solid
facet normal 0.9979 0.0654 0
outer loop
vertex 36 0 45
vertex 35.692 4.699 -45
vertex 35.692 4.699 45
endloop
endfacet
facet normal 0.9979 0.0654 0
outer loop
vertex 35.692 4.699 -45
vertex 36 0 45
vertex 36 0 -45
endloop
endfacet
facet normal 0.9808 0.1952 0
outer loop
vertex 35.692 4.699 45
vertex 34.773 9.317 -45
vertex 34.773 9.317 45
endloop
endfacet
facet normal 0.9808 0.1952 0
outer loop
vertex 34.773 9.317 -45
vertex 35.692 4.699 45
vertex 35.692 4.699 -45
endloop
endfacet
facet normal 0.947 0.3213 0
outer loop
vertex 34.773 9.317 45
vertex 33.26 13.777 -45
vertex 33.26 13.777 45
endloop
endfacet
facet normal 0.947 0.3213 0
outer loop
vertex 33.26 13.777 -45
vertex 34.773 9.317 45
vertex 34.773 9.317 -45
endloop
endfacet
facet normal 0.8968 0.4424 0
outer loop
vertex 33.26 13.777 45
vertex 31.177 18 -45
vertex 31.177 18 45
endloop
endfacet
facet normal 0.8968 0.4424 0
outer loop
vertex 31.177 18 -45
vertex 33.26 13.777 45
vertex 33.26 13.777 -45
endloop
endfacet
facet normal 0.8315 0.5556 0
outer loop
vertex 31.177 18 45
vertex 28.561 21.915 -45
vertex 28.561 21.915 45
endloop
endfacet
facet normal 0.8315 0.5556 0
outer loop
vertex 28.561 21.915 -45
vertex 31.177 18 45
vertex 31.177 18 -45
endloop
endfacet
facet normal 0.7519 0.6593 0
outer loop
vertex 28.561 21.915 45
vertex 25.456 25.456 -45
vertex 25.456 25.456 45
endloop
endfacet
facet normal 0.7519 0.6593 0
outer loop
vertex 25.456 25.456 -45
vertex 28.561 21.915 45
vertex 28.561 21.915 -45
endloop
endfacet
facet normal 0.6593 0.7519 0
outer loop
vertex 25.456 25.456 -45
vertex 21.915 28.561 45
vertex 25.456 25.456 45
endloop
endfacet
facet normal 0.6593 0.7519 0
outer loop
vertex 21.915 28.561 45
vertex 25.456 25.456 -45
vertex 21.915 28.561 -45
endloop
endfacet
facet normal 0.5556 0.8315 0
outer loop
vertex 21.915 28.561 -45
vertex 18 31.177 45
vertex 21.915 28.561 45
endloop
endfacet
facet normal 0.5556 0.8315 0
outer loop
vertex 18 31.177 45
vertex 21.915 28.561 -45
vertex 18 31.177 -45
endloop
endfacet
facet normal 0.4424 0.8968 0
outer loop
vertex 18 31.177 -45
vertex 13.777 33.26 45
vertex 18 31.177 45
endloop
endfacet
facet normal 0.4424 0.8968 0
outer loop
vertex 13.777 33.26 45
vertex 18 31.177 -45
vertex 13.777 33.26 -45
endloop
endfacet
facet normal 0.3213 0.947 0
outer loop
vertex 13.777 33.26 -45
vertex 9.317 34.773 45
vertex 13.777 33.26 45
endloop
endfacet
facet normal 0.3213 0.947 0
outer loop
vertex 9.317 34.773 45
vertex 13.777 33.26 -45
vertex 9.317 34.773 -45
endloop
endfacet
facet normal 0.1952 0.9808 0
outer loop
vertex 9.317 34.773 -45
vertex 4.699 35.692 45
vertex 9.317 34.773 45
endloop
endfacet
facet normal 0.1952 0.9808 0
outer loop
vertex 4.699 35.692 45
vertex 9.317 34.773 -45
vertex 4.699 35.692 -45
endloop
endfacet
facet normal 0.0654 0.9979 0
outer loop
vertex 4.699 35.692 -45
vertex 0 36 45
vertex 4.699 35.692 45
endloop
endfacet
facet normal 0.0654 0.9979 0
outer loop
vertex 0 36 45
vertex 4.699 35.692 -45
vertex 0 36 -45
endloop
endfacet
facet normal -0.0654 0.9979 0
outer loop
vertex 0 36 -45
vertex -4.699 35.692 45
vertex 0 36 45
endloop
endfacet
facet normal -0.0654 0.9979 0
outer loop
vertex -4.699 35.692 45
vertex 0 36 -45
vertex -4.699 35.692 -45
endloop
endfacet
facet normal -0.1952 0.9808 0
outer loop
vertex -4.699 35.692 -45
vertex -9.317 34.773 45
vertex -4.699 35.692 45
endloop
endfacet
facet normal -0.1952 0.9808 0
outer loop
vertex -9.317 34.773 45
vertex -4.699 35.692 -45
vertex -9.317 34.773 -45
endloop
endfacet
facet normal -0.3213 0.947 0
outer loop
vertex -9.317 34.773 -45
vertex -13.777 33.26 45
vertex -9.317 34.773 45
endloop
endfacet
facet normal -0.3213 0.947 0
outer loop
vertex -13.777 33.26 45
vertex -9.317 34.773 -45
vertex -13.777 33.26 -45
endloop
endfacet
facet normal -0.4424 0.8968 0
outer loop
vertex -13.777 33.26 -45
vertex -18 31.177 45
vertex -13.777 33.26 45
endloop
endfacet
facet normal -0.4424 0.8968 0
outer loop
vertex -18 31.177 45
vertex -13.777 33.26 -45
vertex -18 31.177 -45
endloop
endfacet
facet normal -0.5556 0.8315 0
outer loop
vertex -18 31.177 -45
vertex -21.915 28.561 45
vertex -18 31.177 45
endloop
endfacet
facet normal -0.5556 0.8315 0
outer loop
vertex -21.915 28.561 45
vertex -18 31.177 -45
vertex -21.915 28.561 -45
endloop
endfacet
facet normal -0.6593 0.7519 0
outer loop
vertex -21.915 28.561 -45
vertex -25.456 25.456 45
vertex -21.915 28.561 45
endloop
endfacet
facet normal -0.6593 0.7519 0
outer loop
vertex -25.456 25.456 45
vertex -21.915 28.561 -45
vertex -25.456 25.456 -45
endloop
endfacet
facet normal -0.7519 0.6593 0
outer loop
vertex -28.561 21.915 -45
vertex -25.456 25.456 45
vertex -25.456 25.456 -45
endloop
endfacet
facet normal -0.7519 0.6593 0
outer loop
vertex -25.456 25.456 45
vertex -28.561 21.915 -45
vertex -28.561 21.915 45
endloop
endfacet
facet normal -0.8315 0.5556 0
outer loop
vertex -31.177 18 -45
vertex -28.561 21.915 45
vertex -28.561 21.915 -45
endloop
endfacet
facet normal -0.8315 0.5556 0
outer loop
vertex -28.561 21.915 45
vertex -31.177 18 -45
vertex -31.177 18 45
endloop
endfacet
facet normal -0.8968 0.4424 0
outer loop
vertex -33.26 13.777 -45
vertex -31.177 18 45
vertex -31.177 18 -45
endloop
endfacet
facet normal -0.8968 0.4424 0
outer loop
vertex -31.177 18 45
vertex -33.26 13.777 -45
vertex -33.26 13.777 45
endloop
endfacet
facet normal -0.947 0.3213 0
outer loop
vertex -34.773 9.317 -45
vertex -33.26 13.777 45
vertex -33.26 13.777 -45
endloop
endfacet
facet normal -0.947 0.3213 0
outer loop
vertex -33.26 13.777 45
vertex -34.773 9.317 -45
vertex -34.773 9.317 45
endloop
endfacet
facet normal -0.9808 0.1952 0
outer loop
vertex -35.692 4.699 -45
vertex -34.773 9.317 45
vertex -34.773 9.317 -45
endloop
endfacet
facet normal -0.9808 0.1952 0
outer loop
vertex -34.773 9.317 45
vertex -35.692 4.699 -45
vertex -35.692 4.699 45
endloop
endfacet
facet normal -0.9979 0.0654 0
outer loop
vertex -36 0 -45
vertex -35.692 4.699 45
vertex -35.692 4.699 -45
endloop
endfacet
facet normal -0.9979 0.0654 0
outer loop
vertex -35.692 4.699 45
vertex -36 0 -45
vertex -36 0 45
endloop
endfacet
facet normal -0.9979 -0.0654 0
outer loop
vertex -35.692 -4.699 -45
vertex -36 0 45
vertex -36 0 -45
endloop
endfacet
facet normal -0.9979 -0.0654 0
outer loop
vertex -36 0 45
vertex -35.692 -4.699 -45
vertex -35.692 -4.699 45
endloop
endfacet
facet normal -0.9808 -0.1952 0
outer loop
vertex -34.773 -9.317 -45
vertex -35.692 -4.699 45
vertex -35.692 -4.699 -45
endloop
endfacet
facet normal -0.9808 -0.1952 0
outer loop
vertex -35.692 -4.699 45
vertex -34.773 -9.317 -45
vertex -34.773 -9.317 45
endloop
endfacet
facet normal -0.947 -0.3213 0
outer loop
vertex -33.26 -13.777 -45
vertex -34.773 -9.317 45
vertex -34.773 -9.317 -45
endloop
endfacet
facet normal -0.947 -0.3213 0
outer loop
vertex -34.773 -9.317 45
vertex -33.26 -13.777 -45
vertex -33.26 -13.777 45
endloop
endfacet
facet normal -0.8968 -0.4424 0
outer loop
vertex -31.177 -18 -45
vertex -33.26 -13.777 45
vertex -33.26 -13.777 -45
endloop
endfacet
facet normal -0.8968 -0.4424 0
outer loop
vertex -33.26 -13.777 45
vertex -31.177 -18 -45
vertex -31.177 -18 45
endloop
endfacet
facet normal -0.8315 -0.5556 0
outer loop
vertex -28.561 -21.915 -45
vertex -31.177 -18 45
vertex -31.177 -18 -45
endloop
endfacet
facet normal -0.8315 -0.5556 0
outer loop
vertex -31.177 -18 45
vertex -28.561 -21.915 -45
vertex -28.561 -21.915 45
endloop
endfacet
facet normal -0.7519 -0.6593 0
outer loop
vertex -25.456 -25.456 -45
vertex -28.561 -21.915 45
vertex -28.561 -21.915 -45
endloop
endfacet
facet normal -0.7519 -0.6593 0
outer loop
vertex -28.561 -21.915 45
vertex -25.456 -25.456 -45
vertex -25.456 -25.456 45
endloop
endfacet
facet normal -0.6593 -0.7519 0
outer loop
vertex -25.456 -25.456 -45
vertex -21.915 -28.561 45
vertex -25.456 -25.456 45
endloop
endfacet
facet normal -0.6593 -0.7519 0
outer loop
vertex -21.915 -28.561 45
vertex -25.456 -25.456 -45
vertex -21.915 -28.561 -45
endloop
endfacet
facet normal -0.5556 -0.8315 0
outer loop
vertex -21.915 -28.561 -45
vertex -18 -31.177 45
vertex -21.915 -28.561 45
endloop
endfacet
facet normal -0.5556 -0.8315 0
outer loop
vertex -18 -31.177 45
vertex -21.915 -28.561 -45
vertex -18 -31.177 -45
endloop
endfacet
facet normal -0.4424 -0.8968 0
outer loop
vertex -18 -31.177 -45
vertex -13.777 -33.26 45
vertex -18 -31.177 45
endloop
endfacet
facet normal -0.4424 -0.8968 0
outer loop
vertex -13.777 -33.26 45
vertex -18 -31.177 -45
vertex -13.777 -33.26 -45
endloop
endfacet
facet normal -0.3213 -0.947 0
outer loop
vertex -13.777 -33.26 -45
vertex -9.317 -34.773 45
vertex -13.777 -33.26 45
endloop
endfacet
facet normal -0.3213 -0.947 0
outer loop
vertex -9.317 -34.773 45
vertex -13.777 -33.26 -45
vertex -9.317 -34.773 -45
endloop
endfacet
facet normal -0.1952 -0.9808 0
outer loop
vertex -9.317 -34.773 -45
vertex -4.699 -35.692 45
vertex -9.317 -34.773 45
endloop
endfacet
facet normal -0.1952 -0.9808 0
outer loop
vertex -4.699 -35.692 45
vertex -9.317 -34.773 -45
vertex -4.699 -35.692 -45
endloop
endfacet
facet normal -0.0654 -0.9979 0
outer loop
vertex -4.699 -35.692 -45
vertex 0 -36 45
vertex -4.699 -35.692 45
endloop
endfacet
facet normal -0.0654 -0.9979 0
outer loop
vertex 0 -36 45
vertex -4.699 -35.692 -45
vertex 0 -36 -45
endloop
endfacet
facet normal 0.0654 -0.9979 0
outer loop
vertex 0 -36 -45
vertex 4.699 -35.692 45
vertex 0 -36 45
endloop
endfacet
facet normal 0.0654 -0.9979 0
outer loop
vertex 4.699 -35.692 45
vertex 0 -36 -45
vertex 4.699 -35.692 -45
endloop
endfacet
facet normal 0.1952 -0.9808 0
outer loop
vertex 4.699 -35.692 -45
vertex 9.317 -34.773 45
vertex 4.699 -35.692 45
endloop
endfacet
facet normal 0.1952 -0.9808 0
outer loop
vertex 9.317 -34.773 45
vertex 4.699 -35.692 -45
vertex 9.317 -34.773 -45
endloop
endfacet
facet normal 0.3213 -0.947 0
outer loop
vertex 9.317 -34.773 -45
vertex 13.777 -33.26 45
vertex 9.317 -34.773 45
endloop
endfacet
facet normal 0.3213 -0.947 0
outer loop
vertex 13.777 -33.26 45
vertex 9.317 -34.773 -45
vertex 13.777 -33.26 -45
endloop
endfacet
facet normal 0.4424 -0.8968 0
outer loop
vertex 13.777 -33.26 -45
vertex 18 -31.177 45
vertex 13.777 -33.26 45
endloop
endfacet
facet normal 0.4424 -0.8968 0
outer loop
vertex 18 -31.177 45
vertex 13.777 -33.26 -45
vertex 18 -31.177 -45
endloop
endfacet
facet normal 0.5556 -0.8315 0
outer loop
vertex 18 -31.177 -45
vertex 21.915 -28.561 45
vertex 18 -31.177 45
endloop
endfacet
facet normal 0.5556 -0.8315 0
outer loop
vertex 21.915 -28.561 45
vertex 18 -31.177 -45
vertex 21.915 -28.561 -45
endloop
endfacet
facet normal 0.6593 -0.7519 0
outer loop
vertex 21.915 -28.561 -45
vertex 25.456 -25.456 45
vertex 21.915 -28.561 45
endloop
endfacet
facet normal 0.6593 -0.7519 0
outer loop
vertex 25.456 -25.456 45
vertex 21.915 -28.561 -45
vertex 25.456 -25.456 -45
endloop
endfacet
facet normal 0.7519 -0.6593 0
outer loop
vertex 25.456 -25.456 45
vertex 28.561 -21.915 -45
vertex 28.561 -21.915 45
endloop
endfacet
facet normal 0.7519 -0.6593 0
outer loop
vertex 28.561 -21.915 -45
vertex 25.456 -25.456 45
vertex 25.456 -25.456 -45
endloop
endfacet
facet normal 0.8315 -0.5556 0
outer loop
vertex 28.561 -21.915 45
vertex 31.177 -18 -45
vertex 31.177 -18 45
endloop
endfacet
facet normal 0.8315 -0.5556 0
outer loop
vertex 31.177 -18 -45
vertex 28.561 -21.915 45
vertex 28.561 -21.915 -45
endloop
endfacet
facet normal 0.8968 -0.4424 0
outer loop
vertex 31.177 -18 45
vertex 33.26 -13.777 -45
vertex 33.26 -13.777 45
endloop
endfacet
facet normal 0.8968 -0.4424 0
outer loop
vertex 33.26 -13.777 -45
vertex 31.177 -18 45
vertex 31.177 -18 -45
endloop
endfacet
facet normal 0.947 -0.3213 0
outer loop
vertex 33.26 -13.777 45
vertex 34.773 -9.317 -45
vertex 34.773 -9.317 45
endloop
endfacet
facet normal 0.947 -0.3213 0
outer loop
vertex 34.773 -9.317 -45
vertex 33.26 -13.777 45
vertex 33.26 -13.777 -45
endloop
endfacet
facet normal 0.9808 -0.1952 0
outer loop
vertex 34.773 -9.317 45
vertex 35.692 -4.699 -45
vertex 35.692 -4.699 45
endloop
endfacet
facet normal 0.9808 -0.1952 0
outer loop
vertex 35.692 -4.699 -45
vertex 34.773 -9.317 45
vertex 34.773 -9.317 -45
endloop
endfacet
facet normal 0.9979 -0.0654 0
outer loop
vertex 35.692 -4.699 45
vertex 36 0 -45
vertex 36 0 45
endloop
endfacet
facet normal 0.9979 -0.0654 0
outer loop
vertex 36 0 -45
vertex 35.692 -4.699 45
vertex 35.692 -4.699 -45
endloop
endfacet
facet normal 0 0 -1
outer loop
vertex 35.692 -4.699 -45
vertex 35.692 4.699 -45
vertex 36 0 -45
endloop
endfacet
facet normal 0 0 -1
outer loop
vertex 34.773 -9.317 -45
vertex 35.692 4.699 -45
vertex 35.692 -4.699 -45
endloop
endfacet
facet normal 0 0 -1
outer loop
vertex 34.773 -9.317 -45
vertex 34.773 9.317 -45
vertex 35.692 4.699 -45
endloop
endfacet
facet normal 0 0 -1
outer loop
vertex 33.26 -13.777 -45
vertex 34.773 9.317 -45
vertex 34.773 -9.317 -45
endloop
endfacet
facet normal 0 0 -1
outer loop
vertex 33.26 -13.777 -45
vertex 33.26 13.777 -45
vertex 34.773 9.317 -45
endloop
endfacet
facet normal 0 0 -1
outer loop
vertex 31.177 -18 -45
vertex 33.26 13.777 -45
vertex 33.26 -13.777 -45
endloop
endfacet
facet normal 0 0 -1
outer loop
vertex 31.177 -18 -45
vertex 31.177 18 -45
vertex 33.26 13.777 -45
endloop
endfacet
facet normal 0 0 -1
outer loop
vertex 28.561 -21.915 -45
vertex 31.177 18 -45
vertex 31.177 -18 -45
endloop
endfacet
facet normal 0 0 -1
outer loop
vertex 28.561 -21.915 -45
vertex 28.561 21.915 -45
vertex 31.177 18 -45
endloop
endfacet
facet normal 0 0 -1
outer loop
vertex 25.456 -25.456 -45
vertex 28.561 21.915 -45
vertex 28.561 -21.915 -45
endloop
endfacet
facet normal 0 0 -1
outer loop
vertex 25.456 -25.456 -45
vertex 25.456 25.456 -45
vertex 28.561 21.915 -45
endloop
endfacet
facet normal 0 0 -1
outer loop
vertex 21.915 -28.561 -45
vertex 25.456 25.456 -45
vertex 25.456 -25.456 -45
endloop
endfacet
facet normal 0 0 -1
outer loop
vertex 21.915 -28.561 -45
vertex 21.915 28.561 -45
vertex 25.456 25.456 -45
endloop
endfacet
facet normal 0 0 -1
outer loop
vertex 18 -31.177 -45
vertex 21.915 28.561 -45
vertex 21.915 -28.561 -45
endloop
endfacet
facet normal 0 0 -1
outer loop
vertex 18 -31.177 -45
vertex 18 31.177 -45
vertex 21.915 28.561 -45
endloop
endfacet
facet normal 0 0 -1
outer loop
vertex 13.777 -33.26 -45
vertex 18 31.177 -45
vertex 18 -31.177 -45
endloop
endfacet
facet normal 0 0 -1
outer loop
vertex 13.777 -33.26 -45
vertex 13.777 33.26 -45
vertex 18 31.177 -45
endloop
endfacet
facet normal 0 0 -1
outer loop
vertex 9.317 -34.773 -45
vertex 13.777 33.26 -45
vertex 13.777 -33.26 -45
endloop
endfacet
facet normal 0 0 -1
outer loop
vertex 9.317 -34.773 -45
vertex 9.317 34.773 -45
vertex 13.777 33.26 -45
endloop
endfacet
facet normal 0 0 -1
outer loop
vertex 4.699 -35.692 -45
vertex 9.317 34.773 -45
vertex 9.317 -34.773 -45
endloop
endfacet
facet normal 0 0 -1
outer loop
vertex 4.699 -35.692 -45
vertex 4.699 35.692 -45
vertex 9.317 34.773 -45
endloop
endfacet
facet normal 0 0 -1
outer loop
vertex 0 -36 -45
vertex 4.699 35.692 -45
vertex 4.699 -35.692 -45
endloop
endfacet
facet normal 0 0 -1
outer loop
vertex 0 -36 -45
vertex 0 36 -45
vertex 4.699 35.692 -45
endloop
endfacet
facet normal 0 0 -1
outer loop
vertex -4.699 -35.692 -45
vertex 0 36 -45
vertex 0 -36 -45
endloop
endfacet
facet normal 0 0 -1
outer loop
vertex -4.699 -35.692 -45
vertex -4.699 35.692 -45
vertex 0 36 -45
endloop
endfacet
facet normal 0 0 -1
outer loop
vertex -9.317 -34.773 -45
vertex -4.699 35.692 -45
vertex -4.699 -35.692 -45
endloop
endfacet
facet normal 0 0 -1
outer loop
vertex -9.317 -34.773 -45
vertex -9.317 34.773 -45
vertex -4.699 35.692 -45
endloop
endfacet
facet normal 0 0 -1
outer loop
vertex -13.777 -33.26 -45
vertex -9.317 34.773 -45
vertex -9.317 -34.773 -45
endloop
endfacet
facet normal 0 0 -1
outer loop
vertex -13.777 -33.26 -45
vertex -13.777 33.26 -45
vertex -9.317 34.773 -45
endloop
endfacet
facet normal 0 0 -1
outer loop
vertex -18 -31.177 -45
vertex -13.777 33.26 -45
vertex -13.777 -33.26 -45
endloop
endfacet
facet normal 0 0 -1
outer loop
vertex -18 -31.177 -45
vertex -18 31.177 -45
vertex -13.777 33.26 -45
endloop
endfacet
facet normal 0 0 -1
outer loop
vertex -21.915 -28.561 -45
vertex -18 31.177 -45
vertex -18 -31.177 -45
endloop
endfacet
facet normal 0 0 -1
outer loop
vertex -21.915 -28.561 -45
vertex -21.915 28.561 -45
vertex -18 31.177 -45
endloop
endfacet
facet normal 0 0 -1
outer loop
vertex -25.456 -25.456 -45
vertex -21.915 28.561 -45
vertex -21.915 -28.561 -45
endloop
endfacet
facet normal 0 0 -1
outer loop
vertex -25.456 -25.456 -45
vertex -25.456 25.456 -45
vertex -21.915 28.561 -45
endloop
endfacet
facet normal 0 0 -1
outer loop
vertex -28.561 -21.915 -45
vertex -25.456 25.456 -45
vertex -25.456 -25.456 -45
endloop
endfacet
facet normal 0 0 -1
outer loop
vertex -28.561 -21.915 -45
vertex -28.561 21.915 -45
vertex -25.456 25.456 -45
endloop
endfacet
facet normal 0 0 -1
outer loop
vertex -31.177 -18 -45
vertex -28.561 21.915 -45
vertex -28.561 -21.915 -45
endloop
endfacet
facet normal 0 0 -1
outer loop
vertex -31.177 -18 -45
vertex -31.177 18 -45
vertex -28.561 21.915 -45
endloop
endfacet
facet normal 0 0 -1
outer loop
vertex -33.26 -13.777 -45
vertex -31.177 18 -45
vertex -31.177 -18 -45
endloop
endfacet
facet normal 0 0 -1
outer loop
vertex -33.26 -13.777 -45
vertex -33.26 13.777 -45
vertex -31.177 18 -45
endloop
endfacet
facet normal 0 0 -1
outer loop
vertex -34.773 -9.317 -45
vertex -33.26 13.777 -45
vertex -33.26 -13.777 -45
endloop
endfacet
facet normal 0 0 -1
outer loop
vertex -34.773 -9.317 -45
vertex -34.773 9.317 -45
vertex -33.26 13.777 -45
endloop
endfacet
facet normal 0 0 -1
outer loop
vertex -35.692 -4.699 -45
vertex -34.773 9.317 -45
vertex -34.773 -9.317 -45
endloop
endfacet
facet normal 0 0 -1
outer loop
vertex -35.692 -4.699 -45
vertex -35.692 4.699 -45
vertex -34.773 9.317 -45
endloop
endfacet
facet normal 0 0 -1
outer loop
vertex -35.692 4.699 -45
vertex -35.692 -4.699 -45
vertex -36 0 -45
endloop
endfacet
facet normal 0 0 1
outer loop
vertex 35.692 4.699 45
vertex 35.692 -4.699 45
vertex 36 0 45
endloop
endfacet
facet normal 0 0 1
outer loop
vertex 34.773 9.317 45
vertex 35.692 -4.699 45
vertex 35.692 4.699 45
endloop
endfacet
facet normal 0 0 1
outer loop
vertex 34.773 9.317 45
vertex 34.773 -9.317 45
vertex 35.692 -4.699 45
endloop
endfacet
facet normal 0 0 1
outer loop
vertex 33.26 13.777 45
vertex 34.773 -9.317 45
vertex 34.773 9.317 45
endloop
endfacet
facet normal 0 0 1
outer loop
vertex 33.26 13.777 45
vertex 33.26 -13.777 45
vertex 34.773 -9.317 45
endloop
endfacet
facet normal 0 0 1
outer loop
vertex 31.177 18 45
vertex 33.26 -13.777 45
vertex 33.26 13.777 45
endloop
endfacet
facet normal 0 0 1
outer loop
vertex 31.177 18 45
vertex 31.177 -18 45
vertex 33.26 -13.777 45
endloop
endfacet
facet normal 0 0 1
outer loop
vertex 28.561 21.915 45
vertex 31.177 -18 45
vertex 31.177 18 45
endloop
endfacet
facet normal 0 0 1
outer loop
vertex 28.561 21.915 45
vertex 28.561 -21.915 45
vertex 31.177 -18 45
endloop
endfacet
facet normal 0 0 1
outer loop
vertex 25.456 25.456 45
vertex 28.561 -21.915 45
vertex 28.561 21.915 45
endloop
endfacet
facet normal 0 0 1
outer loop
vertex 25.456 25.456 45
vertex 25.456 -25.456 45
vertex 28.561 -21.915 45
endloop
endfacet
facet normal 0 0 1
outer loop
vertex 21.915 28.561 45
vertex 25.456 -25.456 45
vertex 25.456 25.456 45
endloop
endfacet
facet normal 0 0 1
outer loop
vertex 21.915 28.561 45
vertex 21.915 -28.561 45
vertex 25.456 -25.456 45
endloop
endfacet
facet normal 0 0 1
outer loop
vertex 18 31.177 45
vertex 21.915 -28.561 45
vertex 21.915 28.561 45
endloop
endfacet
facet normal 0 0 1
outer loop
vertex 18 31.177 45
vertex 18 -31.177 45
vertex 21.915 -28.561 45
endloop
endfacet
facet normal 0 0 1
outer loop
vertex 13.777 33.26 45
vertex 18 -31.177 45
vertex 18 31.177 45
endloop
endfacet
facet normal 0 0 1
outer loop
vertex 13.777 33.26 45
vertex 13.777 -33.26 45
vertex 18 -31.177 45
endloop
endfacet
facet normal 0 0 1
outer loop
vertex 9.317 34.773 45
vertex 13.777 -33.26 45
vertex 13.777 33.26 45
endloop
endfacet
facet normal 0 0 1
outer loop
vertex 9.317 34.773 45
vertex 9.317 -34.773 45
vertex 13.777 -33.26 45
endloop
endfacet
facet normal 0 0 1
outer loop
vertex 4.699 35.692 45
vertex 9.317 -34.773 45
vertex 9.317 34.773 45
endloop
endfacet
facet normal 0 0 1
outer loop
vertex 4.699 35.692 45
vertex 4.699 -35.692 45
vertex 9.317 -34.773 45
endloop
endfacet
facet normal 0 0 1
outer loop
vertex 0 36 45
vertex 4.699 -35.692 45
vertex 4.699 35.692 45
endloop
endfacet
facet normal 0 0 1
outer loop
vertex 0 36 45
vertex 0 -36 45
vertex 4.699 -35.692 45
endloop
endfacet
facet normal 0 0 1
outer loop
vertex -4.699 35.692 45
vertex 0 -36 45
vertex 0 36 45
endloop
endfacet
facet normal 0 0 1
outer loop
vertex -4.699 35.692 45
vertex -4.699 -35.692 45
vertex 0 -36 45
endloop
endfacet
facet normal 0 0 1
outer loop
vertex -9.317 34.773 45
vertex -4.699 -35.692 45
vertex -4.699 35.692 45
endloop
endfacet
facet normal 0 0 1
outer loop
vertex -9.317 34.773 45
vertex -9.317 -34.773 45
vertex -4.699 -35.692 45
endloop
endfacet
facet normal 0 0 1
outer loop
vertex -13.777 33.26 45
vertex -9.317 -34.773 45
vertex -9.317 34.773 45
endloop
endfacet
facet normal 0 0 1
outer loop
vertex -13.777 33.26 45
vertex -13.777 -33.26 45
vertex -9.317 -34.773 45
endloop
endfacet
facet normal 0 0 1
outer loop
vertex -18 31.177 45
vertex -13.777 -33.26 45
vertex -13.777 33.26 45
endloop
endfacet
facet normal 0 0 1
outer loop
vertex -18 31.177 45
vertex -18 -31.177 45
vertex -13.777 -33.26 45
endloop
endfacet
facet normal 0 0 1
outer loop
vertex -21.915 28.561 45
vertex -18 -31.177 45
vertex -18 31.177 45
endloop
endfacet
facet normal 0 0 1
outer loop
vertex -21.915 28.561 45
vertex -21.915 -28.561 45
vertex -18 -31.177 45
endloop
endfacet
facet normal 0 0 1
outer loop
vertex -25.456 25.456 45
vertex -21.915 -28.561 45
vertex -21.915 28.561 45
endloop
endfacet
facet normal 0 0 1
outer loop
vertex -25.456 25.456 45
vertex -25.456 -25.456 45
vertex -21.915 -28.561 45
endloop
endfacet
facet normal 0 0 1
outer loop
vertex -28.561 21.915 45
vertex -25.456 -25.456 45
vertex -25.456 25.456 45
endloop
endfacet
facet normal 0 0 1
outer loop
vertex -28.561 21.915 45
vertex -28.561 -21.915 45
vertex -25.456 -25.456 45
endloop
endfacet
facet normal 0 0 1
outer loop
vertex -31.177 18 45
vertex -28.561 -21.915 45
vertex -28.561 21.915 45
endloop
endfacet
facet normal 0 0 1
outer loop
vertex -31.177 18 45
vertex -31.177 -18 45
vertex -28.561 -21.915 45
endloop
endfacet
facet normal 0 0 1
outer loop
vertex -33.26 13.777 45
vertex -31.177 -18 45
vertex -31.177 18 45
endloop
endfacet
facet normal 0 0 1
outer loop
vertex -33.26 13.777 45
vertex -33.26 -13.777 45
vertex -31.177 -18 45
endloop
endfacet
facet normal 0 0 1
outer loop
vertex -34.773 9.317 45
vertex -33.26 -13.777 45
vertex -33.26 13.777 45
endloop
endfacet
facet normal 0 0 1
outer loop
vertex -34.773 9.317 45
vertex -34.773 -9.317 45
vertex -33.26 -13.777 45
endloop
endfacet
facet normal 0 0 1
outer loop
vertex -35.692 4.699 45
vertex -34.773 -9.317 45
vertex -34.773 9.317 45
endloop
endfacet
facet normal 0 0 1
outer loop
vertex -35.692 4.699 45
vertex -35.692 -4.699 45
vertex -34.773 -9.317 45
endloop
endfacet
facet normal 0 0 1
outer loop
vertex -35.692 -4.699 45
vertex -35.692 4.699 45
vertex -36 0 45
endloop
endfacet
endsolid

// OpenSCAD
// ========================================
// a cylinder with radius 36 mm and height 90 mm
// NeuroCAD canonical IR; dimensions are millimetres
// ========================================
$fn = 48;

cylinder(r=36, h=90, center=true);
